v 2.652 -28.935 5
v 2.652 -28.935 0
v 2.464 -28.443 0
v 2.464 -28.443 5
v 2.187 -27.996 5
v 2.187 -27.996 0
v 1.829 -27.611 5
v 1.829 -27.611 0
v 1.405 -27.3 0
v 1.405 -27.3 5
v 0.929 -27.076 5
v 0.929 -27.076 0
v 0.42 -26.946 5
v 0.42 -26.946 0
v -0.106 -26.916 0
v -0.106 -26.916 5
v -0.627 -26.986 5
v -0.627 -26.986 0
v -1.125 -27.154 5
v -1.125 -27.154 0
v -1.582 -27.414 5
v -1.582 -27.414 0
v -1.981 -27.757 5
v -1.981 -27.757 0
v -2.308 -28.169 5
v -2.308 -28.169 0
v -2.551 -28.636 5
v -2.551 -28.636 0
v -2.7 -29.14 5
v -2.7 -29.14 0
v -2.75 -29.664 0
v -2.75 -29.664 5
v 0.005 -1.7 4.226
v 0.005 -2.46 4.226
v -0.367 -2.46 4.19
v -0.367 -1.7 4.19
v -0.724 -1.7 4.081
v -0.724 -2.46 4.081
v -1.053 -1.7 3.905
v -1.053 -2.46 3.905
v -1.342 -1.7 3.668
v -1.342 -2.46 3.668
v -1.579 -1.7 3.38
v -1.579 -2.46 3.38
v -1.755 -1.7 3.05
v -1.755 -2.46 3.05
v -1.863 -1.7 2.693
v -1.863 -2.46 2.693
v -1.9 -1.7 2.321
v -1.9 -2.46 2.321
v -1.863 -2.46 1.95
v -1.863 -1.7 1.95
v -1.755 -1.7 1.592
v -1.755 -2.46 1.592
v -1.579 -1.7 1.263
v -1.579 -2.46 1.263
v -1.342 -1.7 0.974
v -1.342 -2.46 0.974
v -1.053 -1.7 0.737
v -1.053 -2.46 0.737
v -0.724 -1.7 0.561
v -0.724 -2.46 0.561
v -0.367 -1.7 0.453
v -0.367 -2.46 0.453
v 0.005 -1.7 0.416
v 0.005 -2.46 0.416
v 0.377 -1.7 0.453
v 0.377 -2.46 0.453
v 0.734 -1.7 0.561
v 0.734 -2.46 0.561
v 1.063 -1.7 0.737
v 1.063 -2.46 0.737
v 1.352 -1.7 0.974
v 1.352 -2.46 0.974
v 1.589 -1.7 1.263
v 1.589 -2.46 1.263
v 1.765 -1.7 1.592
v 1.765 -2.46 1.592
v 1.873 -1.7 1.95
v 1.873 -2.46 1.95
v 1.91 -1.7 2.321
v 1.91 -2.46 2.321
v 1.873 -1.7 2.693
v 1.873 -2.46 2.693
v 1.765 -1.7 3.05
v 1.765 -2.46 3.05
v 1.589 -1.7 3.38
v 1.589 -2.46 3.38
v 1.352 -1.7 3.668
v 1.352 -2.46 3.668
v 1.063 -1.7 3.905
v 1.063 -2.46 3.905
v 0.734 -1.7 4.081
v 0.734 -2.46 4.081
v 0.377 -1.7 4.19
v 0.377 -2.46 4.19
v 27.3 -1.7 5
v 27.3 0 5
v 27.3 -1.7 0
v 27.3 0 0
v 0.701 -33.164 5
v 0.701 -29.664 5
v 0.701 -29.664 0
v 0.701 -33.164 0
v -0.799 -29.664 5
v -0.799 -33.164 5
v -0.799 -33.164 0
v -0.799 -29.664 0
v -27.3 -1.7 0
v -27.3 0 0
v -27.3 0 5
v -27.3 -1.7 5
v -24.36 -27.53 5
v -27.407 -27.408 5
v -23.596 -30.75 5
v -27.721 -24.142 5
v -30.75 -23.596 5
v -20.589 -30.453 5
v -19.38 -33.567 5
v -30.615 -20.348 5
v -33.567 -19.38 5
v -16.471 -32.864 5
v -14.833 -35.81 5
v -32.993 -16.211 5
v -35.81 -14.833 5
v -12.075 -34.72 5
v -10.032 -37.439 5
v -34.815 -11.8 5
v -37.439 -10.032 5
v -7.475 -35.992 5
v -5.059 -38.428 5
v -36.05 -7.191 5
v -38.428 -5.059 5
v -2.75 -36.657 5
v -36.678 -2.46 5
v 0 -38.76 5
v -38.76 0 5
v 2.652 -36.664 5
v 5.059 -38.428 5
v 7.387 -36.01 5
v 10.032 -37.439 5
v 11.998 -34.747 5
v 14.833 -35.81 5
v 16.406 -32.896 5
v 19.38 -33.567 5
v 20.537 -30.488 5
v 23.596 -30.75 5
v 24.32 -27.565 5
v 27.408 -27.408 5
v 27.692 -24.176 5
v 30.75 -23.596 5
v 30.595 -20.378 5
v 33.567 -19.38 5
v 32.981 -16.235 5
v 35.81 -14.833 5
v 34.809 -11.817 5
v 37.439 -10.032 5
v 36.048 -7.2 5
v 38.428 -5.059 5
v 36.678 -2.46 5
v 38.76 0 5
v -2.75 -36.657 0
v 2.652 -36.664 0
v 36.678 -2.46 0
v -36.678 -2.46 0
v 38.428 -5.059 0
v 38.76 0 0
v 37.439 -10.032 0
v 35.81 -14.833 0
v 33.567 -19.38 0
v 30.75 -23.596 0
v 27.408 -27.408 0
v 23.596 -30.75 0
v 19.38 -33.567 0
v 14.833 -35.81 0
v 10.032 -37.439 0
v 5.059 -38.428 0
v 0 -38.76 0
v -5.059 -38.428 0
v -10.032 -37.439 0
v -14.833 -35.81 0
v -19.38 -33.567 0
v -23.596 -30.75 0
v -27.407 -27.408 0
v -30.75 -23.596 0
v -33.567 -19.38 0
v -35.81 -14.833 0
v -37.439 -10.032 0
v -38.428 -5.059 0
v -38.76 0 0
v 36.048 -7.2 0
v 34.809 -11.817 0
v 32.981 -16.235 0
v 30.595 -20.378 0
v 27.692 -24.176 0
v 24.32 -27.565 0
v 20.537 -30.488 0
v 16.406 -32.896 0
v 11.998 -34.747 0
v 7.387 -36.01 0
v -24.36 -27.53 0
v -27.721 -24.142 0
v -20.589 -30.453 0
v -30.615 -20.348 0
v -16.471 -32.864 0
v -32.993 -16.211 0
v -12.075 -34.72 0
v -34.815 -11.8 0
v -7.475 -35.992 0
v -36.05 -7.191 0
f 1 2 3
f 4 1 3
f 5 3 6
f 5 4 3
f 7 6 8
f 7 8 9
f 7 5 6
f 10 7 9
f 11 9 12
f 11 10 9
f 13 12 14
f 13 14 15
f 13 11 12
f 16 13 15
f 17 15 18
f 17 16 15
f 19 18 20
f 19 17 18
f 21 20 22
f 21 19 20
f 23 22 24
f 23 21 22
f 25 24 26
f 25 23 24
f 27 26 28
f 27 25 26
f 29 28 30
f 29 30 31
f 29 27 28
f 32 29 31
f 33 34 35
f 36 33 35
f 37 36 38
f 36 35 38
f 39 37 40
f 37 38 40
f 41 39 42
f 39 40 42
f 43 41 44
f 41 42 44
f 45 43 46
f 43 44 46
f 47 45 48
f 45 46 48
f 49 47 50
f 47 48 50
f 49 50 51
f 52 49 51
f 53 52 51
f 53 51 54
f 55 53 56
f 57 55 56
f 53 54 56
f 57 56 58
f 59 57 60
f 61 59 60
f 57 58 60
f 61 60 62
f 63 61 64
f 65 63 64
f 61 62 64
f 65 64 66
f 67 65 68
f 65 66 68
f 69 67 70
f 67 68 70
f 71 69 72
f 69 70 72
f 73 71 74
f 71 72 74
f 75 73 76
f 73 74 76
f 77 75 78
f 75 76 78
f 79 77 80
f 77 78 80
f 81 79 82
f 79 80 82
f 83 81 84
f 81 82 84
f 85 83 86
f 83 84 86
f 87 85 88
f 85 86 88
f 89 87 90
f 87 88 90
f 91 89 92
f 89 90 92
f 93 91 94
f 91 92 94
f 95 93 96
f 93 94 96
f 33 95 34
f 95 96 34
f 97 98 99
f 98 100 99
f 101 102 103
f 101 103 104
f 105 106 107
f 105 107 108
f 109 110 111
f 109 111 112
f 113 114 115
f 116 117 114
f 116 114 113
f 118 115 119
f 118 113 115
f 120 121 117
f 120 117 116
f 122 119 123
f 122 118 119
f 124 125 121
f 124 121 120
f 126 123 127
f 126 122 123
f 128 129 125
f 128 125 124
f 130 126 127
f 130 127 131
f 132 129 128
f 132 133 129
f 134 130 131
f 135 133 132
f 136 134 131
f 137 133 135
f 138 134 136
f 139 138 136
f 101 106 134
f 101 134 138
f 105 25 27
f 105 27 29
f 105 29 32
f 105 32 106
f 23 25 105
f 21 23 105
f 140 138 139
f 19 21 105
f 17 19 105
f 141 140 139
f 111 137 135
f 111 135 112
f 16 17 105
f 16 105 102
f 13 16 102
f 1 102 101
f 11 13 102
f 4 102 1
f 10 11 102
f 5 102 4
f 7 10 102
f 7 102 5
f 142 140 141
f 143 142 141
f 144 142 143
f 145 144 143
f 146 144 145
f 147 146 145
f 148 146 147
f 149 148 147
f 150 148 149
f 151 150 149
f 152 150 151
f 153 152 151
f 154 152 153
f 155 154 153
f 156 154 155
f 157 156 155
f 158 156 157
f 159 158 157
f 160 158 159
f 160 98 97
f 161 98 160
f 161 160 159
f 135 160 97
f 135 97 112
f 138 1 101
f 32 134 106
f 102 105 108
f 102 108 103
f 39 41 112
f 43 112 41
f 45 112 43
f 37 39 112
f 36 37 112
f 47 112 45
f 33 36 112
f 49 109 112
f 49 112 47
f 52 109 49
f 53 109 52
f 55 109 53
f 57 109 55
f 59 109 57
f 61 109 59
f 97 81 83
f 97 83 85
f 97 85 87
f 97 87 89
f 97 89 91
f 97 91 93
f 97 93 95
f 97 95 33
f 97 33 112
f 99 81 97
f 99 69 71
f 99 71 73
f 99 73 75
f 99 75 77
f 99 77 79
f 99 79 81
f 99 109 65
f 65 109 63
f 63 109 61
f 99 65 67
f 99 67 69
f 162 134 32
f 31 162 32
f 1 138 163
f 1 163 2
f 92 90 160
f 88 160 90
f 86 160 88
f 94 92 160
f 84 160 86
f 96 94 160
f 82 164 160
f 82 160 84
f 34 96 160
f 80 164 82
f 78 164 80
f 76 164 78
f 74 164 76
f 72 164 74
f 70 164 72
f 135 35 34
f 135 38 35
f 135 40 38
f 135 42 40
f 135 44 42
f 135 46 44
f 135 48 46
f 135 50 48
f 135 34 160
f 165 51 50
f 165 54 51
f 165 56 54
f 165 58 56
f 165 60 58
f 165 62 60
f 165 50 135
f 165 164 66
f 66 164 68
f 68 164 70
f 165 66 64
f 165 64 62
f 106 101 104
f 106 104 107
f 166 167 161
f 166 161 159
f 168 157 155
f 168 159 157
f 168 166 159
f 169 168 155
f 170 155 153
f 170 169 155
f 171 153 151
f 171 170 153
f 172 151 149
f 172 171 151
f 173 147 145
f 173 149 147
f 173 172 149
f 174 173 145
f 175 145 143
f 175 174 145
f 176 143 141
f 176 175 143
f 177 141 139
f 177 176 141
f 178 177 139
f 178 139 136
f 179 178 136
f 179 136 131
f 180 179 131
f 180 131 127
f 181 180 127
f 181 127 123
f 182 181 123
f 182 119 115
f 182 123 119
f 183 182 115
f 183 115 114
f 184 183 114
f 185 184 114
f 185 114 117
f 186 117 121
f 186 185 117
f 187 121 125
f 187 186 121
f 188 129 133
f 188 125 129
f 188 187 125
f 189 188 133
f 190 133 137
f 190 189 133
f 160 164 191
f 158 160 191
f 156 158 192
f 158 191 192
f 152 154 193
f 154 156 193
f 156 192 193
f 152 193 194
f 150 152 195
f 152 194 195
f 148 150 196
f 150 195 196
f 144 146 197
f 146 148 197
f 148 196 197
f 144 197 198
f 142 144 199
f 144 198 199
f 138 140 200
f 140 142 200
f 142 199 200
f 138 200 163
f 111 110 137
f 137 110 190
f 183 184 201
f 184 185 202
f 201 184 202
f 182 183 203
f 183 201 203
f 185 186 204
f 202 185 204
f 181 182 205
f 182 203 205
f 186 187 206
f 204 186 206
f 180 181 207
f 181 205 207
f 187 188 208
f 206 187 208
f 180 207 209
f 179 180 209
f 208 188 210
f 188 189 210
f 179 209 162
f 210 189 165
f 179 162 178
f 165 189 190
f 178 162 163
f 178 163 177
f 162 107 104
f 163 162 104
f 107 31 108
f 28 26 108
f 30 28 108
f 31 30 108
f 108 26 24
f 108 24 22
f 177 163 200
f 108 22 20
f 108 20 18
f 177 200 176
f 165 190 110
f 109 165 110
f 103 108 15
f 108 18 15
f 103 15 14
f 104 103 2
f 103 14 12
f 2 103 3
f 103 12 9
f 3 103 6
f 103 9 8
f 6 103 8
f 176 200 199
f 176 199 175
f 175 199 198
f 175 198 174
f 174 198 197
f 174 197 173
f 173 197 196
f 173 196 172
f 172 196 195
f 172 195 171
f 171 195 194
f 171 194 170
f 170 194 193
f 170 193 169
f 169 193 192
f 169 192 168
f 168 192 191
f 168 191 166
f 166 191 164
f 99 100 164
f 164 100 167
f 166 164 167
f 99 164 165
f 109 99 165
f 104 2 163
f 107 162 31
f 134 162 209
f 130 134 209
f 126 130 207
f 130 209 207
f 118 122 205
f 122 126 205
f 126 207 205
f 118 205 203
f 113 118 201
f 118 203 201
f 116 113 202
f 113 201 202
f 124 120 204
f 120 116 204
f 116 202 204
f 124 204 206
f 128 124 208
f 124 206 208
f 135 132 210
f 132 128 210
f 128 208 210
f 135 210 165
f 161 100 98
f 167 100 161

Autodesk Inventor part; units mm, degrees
ref_plane "YZ Plane" through (0, 0, 0) normal (1, 0, 0) x (0, 1, 0)
ref_plane "XZ Plane" through (0, 0, 0) normal (0, 1, 0) x (-1, 0, 0)
ref_plane "XY Plane" through (0, 0, 0) normal (0, 0, 1) x (1, 0, 0)
sketch "Sketch1" plane through (0, 0, 0) normal (0, 0, 1) x (1, 0, 0)
  arc A0 (37.1972, 10.8951) -> (38.76, 0) centre (0, 0) ccw
  arc A1 (-36.6776, -2.4605) -> (36.6776, -2.4605) centre (0, 0) ccw
  line L0 (-36.76, 0) -> (36.76, 0)
  line L1 (-36.76, 0) -> (37.1972, 0)
  line L2 (36.6776, -2.4605) -> (-36.6776, -2.4605)
  line L3 (-36.76, 0) -> (-38.76, 0)
  line L4 (37.1972, 0) -> (38.76, 0)
  line L5 (0, 0) -> (27.3, 0)
  line L6 (27.3, 0) -> (27.3, -1.7)
  line L7 (27.3, -1.7) -> (0, -1.7)
  line L8 (0, -1.7) -> (0, 0)
  line L9 (-27.3, 0) -> (-27.3, -1.7)
  line L10 (-27.3, -1.7) -> (0, -1.7)
  dimension "d0" = 77.52
  dimension "d1" = 2
extrude "Extrusion1" add sketch "Sketch1" along normal blind 5 contours L3 L0 L9 L10 L7 L6 L1 L4 A0
sketch "Sketch2" plane through (-27.3, -1.7, 0) normal (0, 1, 0) x (1, 0, 0)
  line L0 (54.6, 0) -> (0, 0) projected
  line L1 (54.6, 0) -> (54.6, -5) projected
  line L2 (0, 0) -> (0, -5) projected
  point P0 (27.3, 0)
  point P1 (27.305, -2.3213)
  dimension "d7" = 2.3213
  dimension "d28" = 27.305
hole "Hole1" at (0.005, -1.7, 2.3213) direction (0, -1, 0) diameter 3.81 depth 2.54
sketch "Sketch3" plane through (0, 0, 5) normal (0, 0, 1) x (1, 0, 0)
  arc A0 (2.6516, -28.9347) -> (-2.75, -29.6637) centre (0, -29.6637) ccw
  line L0 (-0.7992, -29.6638) -> (0.7008, -29.6638)
  line L1 (2.6516, -29.6637) -> (2.6516, -38.4638)
  line L2 (2.6516, -38.4638) -> (-2.75, -38.4638)
  line L3 (-2.75, -38.4638) -> (-2.75, -29.6637)
  line L4 (-0.7992, -29.6638) -> (0.7008, -29.6638)
  line L5 (0.7008, -29.6638) -> (0.7008, -33.1638)
  line L6 (0.7008, -33.1638) -> (-0.7992, -33.1638)
  line L7 (-0.7992, -33.1638) -> (-0.7992, -29.6638)
  line L8 (2.6516, -29.6637) -> (2.6516, -28.9347)
  point P0 (0, 0)
  point P1 (-0.0492, -29.6638)
  point P2 (2.6516, -30.3927)
  dimension "d16" = 5.5
  dimension "d17" = 3.5
  dimension "d18" = 1.5
  dimension "d19" = 0.75
extrude "Extrusion2" add sketch "Sketch3" against normal up to surface (5 mm away)
properties part number "Siding Lock"
